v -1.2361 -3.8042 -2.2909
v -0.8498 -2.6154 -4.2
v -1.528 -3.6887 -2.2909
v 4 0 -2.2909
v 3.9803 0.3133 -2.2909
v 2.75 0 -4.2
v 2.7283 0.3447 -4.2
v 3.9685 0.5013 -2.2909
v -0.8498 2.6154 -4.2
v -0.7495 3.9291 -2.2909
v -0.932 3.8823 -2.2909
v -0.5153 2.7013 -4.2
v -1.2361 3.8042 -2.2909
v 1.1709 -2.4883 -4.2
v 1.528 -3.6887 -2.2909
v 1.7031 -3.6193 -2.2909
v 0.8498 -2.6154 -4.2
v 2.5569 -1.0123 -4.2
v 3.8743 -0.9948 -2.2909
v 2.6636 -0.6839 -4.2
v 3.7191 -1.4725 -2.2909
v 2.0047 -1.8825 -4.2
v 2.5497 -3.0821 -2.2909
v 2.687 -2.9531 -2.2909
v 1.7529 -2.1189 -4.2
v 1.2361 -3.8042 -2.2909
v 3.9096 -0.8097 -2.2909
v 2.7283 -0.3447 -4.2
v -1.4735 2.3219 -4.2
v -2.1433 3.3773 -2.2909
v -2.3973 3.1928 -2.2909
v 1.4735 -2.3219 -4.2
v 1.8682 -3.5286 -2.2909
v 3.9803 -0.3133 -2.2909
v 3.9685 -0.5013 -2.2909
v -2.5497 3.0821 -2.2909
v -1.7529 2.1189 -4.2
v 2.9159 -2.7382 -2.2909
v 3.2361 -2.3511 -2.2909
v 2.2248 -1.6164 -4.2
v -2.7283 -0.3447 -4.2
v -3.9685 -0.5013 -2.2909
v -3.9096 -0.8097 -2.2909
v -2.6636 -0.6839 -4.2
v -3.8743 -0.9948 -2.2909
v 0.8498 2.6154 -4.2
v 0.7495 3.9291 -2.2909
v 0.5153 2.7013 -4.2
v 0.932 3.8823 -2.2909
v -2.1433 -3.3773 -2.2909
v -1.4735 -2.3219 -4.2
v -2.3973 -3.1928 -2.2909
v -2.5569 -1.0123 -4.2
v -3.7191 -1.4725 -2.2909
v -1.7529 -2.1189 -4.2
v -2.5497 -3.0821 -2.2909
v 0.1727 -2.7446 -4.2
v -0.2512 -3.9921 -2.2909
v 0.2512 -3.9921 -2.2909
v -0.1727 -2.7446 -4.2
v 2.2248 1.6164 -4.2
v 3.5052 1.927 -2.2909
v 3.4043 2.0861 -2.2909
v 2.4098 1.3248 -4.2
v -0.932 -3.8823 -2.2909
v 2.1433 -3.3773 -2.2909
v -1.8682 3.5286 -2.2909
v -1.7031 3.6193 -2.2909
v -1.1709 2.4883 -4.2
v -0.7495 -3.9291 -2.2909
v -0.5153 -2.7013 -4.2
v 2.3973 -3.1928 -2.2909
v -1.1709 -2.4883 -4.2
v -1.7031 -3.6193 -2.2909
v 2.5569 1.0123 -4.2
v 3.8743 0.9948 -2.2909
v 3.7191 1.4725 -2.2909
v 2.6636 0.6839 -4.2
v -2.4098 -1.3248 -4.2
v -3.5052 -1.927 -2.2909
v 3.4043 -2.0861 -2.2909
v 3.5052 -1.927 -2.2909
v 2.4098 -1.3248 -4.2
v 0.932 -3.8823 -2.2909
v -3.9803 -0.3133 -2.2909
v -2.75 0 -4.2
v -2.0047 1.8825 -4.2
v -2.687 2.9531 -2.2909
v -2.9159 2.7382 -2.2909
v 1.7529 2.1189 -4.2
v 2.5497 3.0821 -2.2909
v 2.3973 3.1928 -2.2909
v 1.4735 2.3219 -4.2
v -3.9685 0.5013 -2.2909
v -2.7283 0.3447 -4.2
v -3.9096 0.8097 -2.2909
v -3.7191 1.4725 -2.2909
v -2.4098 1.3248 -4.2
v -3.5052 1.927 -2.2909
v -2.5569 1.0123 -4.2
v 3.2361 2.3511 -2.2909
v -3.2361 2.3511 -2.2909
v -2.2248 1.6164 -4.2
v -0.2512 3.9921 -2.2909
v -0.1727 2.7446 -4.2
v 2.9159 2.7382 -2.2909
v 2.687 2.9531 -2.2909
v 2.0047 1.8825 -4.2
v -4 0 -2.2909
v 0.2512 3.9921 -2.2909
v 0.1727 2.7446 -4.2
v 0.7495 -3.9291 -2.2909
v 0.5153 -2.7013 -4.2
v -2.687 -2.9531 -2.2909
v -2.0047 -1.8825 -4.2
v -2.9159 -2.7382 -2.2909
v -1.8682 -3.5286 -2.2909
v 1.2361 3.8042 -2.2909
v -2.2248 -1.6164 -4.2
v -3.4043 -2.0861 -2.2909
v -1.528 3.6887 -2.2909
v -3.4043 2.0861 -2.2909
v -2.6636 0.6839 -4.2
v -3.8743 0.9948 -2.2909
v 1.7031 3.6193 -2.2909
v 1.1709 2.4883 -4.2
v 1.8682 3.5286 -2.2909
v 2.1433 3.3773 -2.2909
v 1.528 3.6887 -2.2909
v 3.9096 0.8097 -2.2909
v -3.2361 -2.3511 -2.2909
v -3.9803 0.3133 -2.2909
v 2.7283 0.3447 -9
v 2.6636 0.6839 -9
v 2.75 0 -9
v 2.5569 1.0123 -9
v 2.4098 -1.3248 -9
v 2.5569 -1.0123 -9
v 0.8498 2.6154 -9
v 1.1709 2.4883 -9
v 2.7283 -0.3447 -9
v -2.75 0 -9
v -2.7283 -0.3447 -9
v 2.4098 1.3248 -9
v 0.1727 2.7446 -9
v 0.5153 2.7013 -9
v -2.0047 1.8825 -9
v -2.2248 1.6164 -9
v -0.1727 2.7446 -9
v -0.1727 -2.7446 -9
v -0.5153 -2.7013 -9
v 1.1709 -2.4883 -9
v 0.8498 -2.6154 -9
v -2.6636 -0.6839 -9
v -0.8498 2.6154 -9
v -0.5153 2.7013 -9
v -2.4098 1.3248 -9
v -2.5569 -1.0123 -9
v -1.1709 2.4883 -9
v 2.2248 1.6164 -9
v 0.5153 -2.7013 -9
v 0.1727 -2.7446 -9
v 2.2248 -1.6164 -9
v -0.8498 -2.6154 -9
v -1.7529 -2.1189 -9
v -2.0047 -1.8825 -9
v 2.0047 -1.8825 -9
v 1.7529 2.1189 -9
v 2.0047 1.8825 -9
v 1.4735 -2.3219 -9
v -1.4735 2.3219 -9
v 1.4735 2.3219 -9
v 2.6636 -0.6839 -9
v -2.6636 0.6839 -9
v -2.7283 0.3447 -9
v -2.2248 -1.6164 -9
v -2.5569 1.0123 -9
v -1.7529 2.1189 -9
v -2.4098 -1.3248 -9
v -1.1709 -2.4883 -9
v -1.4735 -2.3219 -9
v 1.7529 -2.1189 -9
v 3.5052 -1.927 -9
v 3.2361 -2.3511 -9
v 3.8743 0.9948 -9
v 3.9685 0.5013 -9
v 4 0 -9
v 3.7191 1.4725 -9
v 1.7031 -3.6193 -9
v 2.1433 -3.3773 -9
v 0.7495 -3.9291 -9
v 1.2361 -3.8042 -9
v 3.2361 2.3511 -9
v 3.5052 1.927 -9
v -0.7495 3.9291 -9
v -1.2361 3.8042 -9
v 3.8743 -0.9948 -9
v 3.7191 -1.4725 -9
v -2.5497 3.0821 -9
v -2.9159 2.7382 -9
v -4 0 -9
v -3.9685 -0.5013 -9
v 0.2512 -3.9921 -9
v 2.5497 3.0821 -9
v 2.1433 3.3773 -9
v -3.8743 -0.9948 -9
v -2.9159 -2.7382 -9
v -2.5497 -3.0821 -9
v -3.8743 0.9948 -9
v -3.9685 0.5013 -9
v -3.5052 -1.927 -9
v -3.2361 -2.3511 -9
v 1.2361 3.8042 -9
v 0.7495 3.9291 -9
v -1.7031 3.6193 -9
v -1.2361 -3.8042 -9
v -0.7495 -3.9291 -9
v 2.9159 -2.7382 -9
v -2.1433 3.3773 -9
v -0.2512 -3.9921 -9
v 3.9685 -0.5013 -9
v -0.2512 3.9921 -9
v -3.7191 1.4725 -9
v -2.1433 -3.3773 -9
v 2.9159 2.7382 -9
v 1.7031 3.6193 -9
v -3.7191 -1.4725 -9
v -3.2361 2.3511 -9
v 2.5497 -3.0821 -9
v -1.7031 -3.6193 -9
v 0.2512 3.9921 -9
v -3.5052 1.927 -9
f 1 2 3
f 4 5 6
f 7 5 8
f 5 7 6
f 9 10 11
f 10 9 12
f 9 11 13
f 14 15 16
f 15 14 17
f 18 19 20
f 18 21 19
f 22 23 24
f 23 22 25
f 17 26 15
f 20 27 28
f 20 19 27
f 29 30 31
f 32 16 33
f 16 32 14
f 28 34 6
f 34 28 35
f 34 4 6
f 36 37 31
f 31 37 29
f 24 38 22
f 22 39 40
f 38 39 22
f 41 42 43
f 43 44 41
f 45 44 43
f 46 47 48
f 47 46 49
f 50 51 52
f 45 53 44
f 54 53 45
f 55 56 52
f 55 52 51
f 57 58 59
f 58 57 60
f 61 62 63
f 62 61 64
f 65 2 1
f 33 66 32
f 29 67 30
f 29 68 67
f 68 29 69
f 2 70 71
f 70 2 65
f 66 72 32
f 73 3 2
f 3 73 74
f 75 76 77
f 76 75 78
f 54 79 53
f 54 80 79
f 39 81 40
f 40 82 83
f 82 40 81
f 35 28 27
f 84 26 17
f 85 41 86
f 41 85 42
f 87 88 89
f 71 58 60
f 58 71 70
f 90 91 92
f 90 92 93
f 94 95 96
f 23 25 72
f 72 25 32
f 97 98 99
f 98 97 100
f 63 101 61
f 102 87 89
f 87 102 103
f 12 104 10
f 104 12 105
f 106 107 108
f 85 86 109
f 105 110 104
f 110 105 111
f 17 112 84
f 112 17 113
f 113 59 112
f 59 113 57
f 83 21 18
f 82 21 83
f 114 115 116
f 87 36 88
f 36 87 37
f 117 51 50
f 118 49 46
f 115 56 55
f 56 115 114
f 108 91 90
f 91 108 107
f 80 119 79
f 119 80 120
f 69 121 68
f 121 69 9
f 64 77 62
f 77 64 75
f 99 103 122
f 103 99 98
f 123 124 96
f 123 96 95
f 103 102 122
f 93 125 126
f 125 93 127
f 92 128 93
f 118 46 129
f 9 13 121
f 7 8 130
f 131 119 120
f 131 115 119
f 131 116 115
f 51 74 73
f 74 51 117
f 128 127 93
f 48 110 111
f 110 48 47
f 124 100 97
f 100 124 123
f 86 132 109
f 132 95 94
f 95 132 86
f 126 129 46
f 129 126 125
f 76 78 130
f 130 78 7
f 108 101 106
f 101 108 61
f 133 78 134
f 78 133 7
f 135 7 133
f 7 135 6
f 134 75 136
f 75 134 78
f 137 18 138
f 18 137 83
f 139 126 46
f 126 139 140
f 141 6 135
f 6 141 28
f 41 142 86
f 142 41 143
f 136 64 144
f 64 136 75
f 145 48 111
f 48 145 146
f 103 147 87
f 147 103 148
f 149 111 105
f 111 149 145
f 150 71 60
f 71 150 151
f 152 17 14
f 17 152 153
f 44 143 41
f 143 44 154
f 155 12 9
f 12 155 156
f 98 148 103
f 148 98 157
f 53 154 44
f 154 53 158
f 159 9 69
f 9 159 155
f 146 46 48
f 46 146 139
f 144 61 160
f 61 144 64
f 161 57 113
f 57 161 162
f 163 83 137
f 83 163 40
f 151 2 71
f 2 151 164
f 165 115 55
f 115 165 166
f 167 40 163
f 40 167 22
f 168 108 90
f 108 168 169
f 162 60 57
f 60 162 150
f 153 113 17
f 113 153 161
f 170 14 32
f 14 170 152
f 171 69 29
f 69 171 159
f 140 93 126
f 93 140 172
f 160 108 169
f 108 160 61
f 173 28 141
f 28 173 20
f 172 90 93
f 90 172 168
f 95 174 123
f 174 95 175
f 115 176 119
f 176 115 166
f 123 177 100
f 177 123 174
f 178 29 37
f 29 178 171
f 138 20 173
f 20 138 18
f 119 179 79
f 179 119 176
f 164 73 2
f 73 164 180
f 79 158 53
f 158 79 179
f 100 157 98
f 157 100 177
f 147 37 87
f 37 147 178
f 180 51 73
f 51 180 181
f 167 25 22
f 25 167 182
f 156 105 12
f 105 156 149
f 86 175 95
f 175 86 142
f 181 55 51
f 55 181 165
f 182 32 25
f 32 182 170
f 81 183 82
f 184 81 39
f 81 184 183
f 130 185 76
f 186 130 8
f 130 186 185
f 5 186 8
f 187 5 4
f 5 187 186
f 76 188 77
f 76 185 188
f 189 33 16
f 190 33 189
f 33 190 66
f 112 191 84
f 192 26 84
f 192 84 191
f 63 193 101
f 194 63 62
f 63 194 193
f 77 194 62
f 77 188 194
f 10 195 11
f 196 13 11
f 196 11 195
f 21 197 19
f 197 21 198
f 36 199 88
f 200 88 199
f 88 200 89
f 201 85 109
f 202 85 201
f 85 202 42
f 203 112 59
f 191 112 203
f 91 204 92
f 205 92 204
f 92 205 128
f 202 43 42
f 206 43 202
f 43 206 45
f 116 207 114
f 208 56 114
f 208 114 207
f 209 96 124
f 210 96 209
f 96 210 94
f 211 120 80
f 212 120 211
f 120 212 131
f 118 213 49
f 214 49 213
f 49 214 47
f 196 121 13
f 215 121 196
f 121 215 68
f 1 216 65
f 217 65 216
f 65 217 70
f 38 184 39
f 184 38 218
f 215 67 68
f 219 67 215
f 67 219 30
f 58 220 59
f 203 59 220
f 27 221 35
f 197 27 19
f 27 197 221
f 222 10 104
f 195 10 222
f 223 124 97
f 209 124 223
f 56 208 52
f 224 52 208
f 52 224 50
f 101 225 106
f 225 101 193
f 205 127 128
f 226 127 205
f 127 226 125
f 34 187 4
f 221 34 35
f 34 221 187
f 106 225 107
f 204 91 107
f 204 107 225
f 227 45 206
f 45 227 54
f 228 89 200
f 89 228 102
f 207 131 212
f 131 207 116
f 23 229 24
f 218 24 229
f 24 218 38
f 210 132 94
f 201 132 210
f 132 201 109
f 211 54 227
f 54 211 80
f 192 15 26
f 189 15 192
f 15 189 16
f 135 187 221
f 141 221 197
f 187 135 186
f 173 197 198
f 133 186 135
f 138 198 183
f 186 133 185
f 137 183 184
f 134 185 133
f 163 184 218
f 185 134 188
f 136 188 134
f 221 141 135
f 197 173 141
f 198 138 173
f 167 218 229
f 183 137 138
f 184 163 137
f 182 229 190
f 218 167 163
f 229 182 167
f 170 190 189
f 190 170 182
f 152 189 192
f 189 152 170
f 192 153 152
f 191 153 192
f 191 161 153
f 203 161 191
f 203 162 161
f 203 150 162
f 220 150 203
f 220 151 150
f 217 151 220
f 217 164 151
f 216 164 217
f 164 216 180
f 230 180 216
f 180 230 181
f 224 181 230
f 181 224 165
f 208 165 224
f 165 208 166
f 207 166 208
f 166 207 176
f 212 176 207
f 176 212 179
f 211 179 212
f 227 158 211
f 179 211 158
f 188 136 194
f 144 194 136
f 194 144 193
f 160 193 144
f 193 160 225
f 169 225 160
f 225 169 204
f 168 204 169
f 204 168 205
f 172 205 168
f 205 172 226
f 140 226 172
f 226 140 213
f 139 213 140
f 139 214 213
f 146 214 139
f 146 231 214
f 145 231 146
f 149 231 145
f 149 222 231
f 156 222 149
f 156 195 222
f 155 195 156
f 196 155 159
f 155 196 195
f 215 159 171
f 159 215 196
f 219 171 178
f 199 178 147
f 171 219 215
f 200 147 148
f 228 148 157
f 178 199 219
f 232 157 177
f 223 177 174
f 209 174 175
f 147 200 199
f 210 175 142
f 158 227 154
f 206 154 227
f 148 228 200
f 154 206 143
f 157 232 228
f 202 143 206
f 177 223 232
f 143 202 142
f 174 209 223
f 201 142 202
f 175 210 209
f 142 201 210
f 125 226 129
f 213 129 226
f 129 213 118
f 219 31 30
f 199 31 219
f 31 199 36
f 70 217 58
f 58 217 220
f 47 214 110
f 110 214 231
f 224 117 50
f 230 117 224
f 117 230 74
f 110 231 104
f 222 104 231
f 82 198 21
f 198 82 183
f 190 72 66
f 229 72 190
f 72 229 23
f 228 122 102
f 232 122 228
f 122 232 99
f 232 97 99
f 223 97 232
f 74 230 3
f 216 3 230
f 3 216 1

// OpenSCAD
$fn = 50;

difference() {
	union() {
		translate(v = [0, 0, -9.0]) {
			cylinder(h = 12, r = 4.0);
		}
	}
	union() {
		translate(v = [0, 0, 0]) {
			rotate(a = [0, 0, 0]) {
				difference() {
					union() {
						translate(v = [0, 0, -12.0]) {
							cylinder(h = 12, r = 2.25);
						}
						translate(v = [0, 0, -4.2]) {
							cylinder(h = 4.2, r1 = 2.75, r2 = 5.5);
						}
						translate(v = [0, 0, -12.0]) {
							cylinder(h = 12, r = 2.75);
						}
						translate(v = [0, 0, -12.0]) {
							cylinder(h = 12, r = 2.25);
						}
					}
					union();
				}
			}
		}
		#cylinder(h = 3, r = 6.25);
	}
}
